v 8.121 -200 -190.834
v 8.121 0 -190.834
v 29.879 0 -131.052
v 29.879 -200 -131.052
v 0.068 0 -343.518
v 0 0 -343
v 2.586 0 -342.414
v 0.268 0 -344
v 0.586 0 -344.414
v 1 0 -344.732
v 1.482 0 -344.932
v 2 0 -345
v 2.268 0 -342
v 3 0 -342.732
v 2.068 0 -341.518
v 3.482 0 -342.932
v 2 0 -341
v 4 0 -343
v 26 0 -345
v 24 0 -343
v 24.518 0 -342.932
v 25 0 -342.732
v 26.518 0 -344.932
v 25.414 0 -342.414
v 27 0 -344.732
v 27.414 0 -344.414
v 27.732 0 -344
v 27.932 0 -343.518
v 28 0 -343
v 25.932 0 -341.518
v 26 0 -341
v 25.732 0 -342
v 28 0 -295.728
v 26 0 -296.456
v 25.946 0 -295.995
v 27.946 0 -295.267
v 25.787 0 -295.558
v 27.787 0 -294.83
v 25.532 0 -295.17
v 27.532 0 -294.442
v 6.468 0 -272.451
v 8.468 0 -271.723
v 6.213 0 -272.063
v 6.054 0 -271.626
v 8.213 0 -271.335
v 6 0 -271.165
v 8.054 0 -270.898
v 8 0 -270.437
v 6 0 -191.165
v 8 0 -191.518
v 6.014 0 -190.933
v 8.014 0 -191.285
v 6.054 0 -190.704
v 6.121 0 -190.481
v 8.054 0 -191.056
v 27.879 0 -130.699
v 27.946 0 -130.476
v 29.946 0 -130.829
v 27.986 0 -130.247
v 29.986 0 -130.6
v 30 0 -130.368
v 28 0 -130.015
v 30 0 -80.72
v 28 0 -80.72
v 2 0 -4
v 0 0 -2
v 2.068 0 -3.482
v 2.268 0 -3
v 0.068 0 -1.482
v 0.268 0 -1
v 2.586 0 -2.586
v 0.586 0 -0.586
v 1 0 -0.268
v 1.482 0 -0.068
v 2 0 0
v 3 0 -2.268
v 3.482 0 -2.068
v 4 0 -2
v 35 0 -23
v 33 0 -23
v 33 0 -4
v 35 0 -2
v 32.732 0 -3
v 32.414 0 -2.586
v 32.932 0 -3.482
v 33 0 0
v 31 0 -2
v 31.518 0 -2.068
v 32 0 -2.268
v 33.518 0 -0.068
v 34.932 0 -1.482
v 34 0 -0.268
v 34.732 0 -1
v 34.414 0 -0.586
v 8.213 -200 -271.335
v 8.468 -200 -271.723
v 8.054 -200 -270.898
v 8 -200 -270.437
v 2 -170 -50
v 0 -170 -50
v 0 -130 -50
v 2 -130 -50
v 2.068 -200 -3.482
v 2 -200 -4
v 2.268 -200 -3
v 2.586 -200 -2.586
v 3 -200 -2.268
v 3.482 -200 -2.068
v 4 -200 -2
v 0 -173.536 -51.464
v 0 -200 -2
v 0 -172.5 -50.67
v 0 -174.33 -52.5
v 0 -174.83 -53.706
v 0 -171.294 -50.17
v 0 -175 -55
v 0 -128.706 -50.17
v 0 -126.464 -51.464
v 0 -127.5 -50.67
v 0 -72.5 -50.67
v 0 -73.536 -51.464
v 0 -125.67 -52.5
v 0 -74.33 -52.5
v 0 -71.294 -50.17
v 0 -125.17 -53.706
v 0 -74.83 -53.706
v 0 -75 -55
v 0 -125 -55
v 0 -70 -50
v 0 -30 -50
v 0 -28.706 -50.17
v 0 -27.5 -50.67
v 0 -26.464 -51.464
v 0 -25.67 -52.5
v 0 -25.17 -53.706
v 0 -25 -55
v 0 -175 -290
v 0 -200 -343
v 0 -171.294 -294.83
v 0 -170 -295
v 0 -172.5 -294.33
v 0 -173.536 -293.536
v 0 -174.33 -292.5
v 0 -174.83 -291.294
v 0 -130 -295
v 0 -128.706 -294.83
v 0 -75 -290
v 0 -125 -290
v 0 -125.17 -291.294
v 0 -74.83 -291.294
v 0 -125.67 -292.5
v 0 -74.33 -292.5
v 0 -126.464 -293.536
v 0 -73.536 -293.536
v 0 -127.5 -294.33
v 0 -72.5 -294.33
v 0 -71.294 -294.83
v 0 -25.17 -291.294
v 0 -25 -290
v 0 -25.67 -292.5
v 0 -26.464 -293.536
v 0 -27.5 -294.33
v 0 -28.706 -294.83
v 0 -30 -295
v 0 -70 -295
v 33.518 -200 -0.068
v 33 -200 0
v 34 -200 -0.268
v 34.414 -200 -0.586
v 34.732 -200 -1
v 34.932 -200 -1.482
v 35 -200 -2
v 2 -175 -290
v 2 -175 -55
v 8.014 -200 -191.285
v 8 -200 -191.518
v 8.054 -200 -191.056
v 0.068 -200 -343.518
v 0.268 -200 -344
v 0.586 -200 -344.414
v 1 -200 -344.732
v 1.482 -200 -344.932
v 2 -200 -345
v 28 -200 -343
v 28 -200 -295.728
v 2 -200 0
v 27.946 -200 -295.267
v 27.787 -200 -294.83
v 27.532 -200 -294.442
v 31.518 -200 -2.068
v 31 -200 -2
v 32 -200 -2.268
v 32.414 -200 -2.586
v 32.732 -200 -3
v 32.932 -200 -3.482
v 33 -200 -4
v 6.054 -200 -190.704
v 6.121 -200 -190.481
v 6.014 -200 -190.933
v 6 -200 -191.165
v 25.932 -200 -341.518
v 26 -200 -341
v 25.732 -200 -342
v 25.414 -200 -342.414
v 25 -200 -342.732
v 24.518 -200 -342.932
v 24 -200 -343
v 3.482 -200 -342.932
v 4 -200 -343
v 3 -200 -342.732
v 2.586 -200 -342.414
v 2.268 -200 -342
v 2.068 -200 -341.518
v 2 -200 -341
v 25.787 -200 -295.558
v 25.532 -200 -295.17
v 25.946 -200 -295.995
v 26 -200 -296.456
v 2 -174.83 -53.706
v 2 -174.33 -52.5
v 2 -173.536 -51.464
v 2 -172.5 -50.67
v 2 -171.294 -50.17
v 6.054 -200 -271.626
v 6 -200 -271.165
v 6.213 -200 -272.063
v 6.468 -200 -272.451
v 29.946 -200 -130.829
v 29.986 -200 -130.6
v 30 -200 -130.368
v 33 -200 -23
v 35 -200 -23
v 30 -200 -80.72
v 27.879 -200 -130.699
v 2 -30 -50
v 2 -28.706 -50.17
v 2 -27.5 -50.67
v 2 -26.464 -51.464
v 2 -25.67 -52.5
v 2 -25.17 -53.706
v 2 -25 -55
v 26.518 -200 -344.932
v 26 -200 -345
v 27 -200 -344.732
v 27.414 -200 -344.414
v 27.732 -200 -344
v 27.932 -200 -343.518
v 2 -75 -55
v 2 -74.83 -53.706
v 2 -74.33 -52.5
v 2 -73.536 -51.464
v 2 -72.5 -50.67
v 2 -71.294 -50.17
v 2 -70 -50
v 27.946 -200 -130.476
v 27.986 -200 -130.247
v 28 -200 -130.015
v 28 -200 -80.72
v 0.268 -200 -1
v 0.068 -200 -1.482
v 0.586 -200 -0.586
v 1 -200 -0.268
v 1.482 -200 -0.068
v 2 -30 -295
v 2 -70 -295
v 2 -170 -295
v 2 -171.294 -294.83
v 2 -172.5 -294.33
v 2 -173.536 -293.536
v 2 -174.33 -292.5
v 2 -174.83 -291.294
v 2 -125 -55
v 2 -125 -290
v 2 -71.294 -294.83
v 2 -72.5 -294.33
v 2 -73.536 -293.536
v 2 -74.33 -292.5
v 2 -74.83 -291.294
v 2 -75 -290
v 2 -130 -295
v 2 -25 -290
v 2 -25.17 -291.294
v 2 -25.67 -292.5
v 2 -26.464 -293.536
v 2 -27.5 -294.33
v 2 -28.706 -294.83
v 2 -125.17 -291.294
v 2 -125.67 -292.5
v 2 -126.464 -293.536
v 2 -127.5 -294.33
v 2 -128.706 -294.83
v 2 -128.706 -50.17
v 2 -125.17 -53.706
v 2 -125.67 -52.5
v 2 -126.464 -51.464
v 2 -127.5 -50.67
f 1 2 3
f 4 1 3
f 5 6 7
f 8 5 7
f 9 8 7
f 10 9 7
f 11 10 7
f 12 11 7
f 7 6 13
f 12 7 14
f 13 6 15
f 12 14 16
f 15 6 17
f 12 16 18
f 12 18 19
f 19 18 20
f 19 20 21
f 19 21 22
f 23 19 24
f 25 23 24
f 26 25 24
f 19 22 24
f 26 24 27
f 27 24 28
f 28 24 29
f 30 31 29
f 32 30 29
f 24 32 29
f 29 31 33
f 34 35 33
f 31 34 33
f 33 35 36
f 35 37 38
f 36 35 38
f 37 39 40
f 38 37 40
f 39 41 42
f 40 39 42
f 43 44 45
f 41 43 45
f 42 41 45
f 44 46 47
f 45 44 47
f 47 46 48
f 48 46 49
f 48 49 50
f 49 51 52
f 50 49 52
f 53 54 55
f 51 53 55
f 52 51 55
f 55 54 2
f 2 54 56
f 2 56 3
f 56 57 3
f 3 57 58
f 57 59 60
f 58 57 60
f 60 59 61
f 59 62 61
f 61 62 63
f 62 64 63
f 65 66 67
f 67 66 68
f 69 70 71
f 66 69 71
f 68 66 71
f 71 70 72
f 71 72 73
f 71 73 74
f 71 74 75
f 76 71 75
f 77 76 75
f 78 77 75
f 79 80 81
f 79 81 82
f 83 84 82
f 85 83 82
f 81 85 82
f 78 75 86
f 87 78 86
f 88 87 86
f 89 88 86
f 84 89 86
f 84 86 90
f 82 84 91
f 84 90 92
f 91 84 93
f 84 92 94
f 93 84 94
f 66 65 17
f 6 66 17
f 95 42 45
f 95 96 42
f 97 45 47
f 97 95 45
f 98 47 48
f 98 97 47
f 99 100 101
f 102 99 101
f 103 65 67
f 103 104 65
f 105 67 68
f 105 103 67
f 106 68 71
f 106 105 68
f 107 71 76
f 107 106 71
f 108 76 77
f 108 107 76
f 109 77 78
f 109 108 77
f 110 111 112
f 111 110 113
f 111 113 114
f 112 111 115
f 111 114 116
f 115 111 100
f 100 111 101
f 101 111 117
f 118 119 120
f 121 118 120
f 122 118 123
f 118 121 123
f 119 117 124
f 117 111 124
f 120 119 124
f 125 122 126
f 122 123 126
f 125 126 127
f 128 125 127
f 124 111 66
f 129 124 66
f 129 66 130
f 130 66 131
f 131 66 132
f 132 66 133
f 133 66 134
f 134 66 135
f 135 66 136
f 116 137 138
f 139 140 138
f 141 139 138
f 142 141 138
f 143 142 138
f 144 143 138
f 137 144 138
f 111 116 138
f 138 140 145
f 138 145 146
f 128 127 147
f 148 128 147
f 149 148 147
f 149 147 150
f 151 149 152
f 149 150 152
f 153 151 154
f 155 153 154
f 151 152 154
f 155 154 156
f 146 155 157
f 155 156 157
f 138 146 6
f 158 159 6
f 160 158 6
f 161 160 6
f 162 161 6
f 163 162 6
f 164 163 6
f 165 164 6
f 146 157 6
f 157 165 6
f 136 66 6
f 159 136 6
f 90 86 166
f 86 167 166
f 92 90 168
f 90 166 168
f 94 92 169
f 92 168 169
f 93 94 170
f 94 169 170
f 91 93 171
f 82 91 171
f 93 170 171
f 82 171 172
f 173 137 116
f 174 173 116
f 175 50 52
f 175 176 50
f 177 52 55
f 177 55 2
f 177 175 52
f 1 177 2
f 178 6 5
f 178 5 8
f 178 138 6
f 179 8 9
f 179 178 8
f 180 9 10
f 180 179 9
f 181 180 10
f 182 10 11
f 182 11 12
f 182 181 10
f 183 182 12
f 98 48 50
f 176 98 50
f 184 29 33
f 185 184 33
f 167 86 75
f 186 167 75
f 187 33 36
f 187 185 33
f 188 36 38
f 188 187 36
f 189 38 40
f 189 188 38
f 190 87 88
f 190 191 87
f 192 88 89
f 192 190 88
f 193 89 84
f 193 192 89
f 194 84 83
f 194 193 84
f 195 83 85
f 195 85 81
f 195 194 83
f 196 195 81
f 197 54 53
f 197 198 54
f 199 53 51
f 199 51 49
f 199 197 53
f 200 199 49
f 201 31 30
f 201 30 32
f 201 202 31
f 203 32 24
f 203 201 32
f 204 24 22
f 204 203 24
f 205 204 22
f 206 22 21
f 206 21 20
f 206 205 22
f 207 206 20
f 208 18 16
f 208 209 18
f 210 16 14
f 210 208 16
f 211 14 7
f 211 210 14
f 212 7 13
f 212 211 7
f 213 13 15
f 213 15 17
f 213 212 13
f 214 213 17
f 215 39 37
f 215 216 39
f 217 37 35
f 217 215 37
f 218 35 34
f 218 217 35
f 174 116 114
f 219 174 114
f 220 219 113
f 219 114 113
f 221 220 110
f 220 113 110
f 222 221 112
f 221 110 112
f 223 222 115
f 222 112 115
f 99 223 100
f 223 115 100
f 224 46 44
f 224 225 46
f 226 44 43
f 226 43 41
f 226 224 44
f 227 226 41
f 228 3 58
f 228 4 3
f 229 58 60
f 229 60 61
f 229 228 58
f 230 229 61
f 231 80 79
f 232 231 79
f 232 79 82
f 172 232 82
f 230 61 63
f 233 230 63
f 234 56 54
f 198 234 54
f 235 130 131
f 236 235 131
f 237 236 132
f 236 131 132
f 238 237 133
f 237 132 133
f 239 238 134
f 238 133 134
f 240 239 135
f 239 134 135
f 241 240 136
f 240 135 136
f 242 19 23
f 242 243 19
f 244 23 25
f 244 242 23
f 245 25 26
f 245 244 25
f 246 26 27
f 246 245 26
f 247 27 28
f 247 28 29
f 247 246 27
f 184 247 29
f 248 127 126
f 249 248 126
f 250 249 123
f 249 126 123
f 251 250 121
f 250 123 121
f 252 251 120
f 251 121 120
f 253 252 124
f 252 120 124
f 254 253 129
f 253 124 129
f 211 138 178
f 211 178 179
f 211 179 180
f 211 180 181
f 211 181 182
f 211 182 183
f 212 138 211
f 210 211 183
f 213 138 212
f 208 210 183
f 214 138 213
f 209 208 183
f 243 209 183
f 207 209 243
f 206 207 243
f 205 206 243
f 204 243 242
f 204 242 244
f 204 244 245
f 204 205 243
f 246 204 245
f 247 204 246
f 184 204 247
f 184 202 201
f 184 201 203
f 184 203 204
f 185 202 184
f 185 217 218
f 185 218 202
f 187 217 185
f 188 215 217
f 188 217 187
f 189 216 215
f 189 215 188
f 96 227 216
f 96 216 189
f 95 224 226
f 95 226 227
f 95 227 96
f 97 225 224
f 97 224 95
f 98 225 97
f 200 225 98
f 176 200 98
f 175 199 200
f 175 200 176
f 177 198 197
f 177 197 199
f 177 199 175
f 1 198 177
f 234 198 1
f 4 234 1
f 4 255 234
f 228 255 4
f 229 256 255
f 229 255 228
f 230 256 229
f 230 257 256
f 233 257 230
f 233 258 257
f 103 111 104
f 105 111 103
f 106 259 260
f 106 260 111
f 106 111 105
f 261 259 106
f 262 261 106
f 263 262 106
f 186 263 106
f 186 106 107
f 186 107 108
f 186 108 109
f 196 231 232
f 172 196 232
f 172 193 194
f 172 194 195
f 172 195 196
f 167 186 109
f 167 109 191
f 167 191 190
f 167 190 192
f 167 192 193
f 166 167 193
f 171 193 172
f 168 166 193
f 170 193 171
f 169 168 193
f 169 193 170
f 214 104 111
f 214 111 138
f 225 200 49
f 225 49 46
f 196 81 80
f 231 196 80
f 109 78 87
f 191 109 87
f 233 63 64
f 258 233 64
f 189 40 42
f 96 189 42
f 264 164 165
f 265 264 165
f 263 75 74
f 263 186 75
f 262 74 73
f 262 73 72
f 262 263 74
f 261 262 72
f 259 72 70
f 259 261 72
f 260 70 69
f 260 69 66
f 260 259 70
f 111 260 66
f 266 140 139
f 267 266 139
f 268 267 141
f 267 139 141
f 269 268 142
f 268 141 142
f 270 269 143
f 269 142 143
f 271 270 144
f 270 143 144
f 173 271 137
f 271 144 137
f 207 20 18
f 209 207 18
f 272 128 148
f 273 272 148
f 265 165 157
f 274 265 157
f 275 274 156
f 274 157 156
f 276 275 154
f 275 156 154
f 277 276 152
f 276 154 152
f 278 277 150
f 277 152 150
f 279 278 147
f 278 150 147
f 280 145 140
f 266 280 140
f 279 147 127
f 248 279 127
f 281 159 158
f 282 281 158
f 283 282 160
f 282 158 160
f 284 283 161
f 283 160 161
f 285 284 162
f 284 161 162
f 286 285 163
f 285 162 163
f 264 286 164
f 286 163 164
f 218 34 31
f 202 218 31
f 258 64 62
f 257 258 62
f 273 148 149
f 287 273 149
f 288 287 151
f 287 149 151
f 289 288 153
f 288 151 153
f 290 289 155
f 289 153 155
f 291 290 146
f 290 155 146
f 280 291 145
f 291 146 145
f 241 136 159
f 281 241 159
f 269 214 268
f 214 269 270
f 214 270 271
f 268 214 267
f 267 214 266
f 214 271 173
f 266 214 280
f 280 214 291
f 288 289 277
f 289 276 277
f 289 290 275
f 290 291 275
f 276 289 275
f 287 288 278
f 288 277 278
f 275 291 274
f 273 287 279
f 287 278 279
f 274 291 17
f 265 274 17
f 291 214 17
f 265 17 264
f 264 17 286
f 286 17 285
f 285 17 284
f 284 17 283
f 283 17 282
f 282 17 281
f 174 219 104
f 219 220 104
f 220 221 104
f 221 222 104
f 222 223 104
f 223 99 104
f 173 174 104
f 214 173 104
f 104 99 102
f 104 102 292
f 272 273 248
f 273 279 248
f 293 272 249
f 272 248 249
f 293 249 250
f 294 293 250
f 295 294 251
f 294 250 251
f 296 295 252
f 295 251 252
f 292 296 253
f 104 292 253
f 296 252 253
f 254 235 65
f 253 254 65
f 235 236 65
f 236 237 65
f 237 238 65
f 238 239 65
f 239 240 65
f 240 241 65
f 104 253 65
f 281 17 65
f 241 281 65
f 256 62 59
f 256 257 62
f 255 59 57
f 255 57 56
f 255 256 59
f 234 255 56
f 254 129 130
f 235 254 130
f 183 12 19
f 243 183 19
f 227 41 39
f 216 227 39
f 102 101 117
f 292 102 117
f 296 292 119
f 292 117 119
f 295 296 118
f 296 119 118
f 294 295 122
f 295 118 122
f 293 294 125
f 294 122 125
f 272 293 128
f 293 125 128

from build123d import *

# Parameters (mm, degrees)
F1_DEPTH = 200
F2_R     = 2
F4_DEPTH = 2


with BuildPart() as f1:
    # F0 (on Front) → F1 (new body)
    with BuildSketch(Plane.XZ):
        Polygon((35, 0), (0, 0), (0, -345), (28, -345), (28, -295), (8, -271.164928), (8, -191.164928), (30, -130.720425), (30, -80.720425), (28, -80.720425), (28, -130.367771), (6, -190.812274), (6, -271.892869), (26, -295.72794), (26, -343), (2, -343), (2, -2), (33, -2), (33, -23), (35, -23), align=None)
    extrude(amount=F1_DEPTH)

    # F2
    f2_edges = [f1.edges().sort_by_distance(p)[0] for p in [
        (0, -100, 0),
        (35, -100, 0),
        (33, -100, -2),
        (2, -100, -2),
        (0, -100, -345),
        (2, -100, -343),
        (28, -100, -345),
        (26, -100, -343),
        (26, -100, -295.72794),
        (28, -100, -295),
        (8, -100, -271.164928),
        (6, -100, -271.892869),
        (6, -100, -190.812274),
        (8, -100, -191.164928),
        (30, -100, -130.720425),
        (28, -100, -130.367771),
    ]]
    fillet(f2_edges, radius=F2_R)

    # F3 (on face) → F4 (cut)
    with BuildSketch(Plane(origin=(0, 0, 0), x_dir=(0, -1, 0), z_dir=(-1, 0, 0))):
        with BuildLine():
            Line((70, -50), (30, -50))
            ThreePointArc((30, -50), (26.464466, -51.464466), (25, -55))
            Line((25, -55), (25, -290))
            ThreePointArc((25, -290), (26.464466, -293.535534), (30, -295))
            Line((30, -295), (70, -295))
            ThreePointArc((70, -295), (73.535534, -293.535534), (75, -290))
            Line((75, -290), (75, -55))
            ThreePointArc((75, -55), (73.535534, -51.464466), (70, -50))
        make_face()
        with BuildLine():
            ThreePointArc((175, -55), (173.535534, -51.464466), (170, -50))
            Line((170, -50), (130, -50))
            ThreePointArc((130, -50), (126.464466, -51.464466), (125, -55))
            Line((125, -55), (125, -290))
            ThreePointArc((125, -290), (126.464466, -293.535534), (130, -295))
            Line((130, -295), (170, -295))
            ThreePointArc((170, -295), (173.535534, -293.535534), (175, -290))
            Line((175, -290), (175, -55))
        make_face()
    extrude(amount=-F4_DEPTH, mode=Mode.SUBTRACT)


solid = f1.part
